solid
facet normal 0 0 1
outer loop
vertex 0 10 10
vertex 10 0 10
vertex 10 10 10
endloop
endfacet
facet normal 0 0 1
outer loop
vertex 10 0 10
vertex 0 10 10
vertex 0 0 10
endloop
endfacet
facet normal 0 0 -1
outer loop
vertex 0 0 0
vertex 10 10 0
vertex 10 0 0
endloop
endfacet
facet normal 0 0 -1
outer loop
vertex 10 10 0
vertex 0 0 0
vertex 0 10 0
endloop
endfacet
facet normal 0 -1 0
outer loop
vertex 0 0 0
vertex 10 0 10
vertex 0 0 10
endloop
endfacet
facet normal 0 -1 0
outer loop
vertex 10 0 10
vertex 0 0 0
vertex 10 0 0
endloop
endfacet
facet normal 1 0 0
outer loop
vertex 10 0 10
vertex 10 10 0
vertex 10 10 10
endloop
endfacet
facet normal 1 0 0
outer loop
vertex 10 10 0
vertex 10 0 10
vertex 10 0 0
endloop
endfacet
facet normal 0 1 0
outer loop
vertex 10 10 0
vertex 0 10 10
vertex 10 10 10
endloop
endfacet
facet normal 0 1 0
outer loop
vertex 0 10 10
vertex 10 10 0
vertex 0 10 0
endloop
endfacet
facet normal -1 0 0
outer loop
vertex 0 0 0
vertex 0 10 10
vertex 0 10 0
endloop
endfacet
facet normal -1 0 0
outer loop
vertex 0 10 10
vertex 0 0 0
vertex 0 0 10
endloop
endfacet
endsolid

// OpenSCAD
// M04-T14 fixture: one 10 mm cube, renders with no warning.
cube([10, 10, 10]);
